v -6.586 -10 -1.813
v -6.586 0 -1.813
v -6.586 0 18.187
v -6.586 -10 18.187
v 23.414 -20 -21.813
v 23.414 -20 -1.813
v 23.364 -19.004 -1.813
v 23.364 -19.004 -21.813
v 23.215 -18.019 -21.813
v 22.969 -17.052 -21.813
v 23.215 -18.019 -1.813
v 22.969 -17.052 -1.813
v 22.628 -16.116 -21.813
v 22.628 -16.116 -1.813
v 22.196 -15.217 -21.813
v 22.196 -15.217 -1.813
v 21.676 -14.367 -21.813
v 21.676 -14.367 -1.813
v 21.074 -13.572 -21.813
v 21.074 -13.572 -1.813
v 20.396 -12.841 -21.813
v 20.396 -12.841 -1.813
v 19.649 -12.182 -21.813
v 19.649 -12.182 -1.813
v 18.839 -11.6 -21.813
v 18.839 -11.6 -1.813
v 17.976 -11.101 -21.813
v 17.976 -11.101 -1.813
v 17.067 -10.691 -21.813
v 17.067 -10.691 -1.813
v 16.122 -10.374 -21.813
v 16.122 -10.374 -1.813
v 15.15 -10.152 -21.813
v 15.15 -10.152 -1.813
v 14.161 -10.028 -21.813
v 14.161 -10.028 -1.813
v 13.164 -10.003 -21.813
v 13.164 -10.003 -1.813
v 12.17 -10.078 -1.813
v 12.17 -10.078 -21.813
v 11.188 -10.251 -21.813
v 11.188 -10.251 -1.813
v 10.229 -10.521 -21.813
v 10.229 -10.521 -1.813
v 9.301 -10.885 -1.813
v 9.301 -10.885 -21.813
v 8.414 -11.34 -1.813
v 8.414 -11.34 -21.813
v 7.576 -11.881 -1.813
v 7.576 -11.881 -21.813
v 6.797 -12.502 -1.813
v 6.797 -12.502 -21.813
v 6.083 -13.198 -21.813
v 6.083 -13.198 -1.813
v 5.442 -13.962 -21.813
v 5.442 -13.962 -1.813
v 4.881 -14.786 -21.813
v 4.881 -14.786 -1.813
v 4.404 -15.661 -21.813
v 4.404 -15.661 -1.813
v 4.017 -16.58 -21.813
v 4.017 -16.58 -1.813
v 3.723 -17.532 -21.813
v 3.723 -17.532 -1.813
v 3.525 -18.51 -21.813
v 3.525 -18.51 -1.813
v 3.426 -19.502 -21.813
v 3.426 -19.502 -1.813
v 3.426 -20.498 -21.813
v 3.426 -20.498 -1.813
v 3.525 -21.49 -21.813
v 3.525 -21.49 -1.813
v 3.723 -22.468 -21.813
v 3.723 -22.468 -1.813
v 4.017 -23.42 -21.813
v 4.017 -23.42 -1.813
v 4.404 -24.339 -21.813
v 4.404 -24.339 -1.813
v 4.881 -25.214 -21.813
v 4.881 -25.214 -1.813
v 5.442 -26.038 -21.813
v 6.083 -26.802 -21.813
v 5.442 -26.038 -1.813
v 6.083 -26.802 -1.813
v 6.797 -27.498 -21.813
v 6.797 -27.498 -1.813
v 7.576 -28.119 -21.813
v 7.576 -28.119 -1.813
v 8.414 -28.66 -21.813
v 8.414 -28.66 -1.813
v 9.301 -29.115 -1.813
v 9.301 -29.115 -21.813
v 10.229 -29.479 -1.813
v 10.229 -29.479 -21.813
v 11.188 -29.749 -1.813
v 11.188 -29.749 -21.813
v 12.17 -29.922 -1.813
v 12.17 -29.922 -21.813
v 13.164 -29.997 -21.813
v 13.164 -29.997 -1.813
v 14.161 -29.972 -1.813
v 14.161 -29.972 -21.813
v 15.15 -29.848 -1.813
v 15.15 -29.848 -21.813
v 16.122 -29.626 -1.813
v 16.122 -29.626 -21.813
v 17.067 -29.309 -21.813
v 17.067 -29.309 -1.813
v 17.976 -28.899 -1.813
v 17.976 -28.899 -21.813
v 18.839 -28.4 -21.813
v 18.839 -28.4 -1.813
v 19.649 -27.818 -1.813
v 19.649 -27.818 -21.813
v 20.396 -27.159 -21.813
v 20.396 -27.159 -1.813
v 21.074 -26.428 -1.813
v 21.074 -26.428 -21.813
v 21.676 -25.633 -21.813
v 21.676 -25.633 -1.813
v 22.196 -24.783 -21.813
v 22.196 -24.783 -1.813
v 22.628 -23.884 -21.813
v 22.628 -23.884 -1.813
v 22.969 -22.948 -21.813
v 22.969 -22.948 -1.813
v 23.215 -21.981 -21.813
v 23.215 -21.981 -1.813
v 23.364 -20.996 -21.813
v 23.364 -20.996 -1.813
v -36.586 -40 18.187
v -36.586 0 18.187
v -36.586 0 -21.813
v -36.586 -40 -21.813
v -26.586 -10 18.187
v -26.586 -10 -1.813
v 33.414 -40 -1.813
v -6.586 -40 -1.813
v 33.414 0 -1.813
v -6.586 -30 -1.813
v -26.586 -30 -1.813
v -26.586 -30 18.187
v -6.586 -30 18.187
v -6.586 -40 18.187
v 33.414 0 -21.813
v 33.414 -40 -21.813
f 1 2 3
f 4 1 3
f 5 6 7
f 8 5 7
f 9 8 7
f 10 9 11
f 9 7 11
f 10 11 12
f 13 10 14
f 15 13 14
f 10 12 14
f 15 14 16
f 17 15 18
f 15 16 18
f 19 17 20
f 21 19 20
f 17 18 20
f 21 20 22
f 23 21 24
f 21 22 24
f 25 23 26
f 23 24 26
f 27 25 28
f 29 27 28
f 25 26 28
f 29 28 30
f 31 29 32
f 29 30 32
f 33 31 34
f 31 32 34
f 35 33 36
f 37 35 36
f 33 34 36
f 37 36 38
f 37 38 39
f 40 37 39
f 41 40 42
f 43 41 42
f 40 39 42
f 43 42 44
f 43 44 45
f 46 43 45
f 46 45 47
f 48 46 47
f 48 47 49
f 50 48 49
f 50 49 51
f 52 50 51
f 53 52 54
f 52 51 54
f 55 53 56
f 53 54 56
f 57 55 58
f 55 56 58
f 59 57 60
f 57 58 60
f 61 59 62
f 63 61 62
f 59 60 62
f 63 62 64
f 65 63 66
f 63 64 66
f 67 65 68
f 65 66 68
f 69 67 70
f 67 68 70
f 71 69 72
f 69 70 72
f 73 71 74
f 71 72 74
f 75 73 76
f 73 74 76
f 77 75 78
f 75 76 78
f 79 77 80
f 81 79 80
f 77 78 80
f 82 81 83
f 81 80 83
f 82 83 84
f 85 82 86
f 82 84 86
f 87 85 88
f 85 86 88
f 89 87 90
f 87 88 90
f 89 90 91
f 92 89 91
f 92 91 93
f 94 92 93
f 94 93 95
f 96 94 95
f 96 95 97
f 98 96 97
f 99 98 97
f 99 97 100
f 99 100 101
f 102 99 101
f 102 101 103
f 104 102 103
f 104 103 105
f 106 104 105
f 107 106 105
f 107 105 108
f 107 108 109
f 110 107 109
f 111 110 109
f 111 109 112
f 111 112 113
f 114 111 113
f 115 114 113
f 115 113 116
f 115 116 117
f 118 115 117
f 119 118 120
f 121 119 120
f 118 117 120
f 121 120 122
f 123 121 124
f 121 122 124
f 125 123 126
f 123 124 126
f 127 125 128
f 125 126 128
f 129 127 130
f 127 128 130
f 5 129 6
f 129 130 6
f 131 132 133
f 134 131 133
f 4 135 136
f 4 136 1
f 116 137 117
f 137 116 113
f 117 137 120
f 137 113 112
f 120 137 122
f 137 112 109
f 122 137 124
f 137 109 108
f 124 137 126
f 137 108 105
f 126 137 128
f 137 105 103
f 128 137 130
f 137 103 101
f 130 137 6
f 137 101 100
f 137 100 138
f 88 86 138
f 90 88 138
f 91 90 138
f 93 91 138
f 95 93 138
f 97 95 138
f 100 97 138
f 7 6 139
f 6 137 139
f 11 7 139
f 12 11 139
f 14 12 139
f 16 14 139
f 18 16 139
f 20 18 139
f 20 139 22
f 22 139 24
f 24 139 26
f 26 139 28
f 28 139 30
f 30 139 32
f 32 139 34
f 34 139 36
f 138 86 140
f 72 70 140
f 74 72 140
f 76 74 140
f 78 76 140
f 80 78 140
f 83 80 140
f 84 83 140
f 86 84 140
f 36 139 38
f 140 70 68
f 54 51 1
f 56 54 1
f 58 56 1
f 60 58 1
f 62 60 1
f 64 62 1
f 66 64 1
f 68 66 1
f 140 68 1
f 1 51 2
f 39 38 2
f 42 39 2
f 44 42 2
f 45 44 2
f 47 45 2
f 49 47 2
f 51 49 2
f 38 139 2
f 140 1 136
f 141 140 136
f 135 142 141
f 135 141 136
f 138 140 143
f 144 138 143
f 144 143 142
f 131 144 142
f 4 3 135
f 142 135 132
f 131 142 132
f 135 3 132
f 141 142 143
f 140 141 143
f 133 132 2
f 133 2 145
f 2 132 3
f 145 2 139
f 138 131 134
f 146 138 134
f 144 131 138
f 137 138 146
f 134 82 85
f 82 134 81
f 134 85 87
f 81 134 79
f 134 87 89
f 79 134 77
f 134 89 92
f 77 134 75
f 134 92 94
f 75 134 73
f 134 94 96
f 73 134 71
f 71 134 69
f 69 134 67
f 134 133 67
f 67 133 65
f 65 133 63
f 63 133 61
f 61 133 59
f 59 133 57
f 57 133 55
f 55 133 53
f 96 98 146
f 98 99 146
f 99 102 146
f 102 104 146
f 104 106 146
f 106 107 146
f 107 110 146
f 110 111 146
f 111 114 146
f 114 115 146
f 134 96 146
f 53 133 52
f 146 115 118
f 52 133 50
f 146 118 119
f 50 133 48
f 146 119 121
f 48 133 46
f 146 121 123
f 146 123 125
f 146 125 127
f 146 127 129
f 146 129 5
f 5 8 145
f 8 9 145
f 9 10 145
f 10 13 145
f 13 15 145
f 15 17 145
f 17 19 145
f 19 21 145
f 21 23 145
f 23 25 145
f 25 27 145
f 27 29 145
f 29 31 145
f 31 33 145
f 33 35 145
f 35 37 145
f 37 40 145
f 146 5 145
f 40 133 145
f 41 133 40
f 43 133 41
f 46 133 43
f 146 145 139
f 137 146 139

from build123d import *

# Parameters (mm, degrees)
F1_DEPTH = 40
F2_W     = 20
F2_H     = 20
F3_DEPTH = 20
F4_R     = 10
F5_DEPTH = 20


with BuildPart() as f1:
    # F0 (on Front) → F1 (new body)
    with BuildSketch(Plane.XZ):
        Polygon((-26.586315, 18.18695), (-36.586315, 18.18695), (-36.586315, -21.81305), (33.413685, -21.81305), (33.413685, -1.81305), (-6.586315, -1.81305), align=None)
        Polygon((-6.586315, 18.18695), (-26.586315, 18.18695), (-6.586315, -1.81305), align=None)
    extrude(amount=F1_DEPTH)

    # F2 (on face) → F3 (cut)
    with BuildSketch(Plane.XY.offset(18.18695)):
        with Locations((-16.586315, -20)):
            Rectangle(F2_W, F2_H)
    extrude(amount=-F3_DEPTH, mode=Mode.SUBTRACT)

    # F4 (on face) → F5 (cut)
    with BuildSketch(Plane.XY.offset(-1.81305)):
        with Locations((13.413685, -20)):
            Circle(F4_R)
    extrude(amount=-F5_DEPTH, mode=Mode.SUBTRACT)


solid = f1.part
